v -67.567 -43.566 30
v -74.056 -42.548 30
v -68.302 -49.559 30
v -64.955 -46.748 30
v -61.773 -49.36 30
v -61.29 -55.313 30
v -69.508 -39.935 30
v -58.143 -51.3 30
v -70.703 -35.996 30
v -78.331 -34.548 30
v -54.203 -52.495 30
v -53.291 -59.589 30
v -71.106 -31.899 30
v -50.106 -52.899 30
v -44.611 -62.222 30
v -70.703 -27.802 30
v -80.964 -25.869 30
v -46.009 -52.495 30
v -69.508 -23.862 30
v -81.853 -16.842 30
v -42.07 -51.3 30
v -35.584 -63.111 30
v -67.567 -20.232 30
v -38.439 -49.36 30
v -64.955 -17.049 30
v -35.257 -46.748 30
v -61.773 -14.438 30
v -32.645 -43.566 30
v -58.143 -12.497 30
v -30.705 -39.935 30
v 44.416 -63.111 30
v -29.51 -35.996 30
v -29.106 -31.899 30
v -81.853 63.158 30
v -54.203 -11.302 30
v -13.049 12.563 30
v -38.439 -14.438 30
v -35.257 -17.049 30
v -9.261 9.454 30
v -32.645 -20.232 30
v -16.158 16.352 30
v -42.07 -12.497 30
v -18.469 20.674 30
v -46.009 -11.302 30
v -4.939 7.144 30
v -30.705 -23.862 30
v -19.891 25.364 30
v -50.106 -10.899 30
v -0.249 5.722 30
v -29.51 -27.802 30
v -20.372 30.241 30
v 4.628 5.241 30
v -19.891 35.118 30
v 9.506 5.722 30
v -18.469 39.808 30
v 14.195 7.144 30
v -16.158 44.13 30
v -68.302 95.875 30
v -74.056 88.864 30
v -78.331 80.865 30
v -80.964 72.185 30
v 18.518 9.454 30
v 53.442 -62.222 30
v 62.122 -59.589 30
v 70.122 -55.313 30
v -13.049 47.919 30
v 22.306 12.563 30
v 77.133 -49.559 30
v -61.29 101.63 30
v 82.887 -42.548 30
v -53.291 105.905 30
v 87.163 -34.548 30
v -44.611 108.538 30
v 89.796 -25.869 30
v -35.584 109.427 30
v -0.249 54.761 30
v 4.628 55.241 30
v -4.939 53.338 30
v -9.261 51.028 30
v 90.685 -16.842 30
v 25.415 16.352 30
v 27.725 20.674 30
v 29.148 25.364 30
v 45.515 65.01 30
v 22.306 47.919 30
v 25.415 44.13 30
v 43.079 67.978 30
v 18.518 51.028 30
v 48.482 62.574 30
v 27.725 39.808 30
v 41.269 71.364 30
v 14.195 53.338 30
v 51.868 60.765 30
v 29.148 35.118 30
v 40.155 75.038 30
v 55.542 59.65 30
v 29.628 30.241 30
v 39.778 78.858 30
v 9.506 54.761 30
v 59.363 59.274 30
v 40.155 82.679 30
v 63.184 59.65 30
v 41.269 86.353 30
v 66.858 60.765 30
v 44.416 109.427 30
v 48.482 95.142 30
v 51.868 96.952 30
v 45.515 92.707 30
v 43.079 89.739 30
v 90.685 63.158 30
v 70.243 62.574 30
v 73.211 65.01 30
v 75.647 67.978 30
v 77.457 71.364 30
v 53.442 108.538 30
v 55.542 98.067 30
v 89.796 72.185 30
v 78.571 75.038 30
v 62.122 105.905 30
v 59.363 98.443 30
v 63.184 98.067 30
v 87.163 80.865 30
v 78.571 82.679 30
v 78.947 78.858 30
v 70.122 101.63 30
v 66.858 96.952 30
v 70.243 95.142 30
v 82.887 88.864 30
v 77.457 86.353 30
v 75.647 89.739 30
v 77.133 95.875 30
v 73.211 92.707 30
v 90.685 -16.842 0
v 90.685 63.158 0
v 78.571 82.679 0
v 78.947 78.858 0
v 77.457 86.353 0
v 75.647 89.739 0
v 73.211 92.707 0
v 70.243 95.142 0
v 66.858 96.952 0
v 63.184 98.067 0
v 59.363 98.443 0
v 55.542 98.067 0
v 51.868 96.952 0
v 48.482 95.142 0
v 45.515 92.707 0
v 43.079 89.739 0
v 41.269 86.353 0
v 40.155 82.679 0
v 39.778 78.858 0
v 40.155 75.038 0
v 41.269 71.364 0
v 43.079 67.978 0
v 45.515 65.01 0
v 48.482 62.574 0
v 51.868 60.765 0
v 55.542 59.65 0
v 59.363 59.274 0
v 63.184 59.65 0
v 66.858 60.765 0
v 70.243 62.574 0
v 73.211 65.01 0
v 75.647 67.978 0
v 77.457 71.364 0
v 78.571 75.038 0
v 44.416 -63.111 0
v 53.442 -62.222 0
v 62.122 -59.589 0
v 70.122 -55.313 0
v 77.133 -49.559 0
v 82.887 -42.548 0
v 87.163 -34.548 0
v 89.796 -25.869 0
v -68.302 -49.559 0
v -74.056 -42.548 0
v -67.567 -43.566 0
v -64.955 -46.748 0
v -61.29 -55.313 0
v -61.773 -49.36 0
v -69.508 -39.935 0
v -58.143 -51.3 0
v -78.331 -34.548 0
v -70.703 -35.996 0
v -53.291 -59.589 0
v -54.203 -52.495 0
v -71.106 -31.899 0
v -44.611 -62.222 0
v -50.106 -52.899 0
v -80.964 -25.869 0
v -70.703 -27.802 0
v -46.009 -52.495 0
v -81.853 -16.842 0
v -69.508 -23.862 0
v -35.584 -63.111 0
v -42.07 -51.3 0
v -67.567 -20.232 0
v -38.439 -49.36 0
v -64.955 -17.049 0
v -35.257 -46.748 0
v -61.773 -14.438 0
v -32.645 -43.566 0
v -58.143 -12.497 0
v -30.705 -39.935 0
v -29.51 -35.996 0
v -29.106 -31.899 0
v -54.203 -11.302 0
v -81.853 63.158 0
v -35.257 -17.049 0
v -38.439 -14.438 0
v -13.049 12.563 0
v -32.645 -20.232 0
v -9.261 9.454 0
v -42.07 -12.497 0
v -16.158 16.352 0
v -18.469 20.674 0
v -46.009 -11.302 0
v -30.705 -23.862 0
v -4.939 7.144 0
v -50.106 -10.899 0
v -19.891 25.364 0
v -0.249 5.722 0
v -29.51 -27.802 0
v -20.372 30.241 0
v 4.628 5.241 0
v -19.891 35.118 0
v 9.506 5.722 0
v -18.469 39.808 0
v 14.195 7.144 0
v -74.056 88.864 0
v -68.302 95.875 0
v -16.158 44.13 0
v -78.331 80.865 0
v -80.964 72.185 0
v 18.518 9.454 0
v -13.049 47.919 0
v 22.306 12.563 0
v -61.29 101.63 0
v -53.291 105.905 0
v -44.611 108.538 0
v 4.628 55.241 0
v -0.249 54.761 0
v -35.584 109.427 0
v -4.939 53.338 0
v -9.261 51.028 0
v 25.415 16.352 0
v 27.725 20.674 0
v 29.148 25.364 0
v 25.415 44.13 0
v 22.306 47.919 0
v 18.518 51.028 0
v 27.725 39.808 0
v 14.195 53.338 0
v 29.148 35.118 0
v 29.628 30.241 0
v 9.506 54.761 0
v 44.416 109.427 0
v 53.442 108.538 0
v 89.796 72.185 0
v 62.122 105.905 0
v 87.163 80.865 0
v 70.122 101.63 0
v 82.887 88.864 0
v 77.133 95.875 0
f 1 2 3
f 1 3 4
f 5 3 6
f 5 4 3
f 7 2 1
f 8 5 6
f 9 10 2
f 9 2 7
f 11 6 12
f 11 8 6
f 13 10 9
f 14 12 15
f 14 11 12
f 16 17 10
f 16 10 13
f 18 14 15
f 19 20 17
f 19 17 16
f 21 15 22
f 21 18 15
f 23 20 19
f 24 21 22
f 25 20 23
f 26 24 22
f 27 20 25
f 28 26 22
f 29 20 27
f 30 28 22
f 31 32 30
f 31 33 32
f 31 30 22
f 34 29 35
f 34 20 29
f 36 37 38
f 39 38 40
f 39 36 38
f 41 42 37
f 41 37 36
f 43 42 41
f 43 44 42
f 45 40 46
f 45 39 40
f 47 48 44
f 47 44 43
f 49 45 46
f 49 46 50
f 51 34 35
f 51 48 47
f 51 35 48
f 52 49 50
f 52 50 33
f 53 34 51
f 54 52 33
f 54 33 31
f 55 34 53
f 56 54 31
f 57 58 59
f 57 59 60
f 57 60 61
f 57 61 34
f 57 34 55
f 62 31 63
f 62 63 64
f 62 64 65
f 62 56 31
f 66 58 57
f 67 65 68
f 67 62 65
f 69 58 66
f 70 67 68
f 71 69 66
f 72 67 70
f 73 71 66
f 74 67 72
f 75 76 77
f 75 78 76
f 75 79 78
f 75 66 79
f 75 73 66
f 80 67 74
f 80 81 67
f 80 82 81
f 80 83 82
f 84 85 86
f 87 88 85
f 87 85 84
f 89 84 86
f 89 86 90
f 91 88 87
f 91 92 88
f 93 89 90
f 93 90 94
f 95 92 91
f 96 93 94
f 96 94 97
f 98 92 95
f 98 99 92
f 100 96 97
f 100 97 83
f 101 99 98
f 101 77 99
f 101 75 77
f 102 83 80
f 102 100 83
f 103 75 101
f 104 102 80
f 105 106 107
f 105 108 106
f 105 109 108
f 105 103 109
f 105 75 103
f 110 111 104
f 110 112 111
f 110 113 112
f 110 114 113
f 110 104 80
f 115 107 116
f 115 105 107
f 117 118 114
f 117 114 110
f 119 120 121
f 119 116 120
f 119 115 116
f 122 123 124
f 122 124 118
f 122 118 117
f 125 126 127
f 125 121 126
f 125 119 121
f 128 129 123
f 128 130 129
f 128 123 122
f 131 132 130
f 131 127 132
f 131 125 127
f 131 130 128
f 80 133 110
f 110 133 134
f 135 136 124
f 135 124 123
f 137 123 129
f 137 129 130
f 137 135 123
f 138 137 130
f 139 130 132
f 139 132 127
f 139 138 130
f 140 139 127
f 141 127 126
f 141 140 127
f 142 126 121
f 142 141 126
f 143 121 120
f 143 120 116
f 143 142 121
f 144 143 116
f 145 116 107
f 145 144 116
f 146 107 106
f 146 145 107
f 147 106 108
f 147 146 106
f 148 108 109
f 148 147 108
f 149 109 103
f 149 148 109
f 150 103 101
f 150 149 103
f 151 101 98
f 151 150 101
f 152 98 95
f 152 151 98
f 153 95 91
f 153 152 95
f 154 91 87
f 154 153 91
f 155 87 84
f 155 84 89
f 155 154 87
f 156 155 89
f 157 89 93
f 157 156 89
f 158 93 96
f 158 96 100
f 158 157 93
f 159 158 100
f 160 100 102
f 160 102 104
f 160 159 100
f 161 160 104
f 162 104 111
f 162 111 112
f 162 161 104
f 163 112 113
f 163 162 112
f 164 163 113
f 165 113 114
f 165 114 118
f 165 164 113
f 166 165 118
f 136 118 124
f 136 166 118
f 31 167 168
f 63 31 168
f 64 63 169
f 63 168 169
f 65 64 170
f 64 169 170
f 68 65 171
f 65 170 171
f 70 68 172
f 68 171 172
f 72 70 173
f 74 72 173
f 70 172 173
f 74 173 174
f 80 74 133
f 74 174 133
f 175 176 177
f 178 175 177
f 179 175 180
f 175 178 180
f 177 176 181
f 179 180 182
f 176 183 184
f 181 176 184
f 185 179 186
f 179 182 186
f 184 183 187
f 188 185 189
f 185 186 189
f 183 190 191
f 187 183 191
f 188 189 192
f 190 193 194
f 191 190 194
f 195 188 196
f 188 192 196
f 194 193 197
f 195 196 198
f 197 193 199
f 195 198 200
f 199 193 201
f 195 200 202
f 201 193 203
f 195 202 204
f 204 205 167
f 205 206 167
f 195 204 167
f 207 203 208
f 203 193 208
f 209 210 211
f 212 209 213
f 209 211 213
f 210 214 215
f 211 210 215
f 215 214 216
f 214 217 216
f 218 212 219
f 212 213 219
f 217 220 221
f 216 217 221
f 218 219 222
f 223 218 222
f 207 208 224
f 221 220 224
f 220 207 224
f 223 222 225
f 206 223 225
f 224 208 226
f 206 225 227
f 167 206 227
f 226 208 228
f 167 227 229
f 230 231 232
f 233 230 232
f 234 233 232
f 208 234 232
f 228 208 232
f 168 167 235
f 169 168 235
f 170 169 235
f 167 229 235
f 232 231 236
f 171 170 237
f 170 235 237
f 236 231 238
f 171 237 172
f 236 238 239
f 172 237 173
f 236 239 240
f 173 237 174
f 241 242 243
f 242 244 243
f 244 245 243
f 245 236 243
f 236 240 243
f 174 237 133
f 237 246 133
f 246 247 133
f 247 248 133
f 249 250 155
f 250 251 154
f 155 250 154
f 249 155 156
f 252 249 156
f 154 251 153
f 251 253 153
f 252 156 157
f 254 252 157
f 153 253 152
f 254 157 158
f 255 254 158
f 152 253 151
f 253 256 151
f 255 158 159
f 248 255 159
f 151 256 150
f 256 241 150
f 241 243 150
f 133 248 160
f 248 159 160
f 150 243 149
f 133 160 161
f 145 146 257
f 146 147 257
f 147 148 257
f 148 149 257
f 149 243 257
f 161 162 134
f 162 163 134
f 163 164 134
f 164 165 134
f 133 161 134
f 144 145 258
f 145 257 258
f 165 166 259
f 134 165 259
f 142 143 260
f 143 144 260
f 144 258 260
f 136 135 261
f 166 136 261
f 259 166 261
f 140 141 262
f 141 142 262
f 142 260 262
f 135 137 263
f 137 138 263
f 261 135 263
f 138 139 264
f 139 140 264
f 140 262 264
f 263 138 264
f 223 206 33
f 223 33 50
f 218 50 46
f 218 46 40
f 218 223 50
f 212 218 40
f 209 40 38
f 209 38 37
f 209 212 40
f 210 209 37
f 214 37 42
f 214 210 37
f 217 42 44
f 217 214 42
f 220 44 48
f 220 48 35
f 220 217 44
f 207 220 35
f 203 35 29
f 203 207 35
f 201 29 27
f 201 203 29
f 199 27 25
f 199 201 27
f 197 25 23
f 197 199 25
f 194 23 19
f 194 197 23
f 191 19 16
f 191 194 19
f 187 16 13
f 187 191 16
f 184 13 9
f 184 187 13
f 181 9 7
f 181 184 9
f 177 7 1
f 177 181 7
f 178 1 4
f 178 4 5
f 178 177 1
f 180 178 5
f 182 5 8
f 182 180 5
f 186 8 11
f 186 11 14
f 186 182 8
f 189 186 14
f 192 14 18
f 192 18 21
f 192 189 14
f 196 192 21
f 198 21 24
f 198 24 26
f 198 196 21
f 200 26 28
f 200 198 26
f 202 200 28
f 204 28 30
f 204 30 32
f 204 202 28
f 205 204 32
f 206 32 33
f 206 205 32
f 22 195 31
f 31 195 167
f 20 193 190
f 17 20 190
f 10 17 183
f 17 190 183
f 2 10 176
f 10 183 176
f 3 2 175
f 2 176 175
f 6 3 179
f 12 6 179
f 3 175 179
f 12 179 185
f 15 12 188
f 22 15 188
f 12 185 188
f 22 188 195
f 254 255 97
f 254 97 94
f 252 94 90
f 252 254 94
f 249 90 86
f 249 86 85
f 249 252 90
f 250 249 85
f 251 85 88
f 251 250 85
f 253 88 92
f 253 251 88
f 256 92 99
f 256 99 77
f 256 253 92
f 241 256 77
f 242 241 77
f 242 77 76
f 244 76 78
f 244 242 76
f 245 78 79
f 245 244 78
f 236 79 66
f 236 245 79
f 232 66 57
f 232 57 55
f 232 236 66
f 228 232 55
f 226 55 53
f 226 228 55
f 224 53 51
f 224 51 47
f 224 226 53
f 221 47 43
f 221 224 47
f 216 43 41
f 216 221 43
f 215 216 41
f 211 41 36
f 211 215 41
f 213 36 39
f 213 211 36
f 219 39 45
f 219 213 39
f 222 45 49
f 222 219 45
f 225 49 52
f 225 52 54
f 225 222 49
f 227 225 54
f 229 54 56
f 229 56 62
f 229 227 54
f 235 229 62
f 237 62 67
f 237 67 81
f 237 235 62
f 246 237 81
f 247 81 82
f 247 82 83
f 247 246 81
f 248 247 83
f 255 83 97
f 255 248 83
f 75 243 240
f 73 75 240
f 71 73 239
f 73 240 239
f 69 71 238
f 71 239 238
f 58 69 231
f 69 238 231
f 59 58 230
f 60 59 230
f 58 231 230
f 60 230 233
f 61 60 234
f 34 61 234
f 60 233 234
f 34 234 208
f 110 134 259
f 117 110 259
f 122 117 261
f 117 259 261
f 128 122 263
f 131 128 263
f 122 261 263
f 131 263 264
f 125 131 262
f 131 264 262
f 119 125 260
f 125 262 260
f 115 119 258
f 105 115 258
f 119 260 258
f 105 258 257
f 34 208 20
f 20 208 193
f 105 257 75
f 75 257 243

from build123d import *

# Parameters (mm, degrees)
SKETCH_R     = 25
SKETCH_R_2   = 21
SKETCH_R_3   = 19.584537
PAD_DEPTH    = 30
PAD001_DEPTH = 30


with BuildPart() as part:
    # Sketch → Pad (new body)
    with BuildSketch(Plane.XY):
        with BuildLine():
            Line((-35.584206, -63.111127), (44.415794, -63.111127))
            ThreePointArc((44.415794, -63.111127), (77.13309, -49.55918), (90.685038, -16.841884))
            Line((90.685038, -16.841884), (90.685038, 63.158116))
            ThreePointArc((90.685038, 63.158116), (77.13309, 95.875412), (44.415794, 109.427359))
            Line((44.415794, 109.427359), (-35.584206, 109.427359))
            ThreePointArc((-35.584206, 109.427359), (-68.301501, 95.875412), (-81.853449, 63.158116))
            Line((-81.853449, 63.158116), (-81.853449, -16.841884))
            ThreePointArc((-81.853449, -16.841884), (-68.301501, -49.55918), (-35.584206, -63.111127))
        make_face()
        with Locations((4.62833, 30.241158)):
            Circle(SKETCH_R, mode=Mode.SUBTRACT)
        with Locations((-50.106209, -31.898642)):
            Circle(SKETCH_R_2, mode=Mode.SUBTRACT)
        with Locations((59.362869, 78.858307)):
            Circle(SKETCH_R_3, mode=Mode.SUBTRACT)
    extrude(amount=PAD_DEPTH)

    # Sketch → Pad001 (join)
    with BuildSketch(Plane.XY):
        with BuildLine():
            Line((-35.584206, -63.111127), (44.415794, -63.111127))
            ThreePointArc((44.415794, -63.111127), (77.13309, -49.55918), (90.685038, -16.841884))
            Line((90.685038, -16.841884), (90.685038, 63.158116))
            ThreePointArc((90.685038, 63.158116), (77.13309, 95.875412), (44.415794, 109.427359))
            Line((44.415794, 109.427359), (-35.584206, 109.427359))
            ThreePointArc((-35.584206, 109.427359), (-68.301501, 95.875412), (-81.853449, 63.158116))
            Line((-81.853449, 63.158116), (-81.853449, -16.841884))
            ThreePointArc((-81.853449, -16.841884), (-68.301501, -49.55918), (-35.584206, -63.111127))
        make_face()
        with Locations((4.62833, 30.241158)):
            Circle(SKETCH_R, mode=Mode.SUBTRACT)
        with Locations((-50.106209, -31.898642)):
            Circle(SKETCH_R_2, mode=Mode.SUBTRACT)
        with Locations((59.362869, 78.858307)):
            Circle(SKETCH_R_3, mode=Mode.SUBTRACT)
    extrude(amount=PAD001_DEPTH)


solid = part.part
